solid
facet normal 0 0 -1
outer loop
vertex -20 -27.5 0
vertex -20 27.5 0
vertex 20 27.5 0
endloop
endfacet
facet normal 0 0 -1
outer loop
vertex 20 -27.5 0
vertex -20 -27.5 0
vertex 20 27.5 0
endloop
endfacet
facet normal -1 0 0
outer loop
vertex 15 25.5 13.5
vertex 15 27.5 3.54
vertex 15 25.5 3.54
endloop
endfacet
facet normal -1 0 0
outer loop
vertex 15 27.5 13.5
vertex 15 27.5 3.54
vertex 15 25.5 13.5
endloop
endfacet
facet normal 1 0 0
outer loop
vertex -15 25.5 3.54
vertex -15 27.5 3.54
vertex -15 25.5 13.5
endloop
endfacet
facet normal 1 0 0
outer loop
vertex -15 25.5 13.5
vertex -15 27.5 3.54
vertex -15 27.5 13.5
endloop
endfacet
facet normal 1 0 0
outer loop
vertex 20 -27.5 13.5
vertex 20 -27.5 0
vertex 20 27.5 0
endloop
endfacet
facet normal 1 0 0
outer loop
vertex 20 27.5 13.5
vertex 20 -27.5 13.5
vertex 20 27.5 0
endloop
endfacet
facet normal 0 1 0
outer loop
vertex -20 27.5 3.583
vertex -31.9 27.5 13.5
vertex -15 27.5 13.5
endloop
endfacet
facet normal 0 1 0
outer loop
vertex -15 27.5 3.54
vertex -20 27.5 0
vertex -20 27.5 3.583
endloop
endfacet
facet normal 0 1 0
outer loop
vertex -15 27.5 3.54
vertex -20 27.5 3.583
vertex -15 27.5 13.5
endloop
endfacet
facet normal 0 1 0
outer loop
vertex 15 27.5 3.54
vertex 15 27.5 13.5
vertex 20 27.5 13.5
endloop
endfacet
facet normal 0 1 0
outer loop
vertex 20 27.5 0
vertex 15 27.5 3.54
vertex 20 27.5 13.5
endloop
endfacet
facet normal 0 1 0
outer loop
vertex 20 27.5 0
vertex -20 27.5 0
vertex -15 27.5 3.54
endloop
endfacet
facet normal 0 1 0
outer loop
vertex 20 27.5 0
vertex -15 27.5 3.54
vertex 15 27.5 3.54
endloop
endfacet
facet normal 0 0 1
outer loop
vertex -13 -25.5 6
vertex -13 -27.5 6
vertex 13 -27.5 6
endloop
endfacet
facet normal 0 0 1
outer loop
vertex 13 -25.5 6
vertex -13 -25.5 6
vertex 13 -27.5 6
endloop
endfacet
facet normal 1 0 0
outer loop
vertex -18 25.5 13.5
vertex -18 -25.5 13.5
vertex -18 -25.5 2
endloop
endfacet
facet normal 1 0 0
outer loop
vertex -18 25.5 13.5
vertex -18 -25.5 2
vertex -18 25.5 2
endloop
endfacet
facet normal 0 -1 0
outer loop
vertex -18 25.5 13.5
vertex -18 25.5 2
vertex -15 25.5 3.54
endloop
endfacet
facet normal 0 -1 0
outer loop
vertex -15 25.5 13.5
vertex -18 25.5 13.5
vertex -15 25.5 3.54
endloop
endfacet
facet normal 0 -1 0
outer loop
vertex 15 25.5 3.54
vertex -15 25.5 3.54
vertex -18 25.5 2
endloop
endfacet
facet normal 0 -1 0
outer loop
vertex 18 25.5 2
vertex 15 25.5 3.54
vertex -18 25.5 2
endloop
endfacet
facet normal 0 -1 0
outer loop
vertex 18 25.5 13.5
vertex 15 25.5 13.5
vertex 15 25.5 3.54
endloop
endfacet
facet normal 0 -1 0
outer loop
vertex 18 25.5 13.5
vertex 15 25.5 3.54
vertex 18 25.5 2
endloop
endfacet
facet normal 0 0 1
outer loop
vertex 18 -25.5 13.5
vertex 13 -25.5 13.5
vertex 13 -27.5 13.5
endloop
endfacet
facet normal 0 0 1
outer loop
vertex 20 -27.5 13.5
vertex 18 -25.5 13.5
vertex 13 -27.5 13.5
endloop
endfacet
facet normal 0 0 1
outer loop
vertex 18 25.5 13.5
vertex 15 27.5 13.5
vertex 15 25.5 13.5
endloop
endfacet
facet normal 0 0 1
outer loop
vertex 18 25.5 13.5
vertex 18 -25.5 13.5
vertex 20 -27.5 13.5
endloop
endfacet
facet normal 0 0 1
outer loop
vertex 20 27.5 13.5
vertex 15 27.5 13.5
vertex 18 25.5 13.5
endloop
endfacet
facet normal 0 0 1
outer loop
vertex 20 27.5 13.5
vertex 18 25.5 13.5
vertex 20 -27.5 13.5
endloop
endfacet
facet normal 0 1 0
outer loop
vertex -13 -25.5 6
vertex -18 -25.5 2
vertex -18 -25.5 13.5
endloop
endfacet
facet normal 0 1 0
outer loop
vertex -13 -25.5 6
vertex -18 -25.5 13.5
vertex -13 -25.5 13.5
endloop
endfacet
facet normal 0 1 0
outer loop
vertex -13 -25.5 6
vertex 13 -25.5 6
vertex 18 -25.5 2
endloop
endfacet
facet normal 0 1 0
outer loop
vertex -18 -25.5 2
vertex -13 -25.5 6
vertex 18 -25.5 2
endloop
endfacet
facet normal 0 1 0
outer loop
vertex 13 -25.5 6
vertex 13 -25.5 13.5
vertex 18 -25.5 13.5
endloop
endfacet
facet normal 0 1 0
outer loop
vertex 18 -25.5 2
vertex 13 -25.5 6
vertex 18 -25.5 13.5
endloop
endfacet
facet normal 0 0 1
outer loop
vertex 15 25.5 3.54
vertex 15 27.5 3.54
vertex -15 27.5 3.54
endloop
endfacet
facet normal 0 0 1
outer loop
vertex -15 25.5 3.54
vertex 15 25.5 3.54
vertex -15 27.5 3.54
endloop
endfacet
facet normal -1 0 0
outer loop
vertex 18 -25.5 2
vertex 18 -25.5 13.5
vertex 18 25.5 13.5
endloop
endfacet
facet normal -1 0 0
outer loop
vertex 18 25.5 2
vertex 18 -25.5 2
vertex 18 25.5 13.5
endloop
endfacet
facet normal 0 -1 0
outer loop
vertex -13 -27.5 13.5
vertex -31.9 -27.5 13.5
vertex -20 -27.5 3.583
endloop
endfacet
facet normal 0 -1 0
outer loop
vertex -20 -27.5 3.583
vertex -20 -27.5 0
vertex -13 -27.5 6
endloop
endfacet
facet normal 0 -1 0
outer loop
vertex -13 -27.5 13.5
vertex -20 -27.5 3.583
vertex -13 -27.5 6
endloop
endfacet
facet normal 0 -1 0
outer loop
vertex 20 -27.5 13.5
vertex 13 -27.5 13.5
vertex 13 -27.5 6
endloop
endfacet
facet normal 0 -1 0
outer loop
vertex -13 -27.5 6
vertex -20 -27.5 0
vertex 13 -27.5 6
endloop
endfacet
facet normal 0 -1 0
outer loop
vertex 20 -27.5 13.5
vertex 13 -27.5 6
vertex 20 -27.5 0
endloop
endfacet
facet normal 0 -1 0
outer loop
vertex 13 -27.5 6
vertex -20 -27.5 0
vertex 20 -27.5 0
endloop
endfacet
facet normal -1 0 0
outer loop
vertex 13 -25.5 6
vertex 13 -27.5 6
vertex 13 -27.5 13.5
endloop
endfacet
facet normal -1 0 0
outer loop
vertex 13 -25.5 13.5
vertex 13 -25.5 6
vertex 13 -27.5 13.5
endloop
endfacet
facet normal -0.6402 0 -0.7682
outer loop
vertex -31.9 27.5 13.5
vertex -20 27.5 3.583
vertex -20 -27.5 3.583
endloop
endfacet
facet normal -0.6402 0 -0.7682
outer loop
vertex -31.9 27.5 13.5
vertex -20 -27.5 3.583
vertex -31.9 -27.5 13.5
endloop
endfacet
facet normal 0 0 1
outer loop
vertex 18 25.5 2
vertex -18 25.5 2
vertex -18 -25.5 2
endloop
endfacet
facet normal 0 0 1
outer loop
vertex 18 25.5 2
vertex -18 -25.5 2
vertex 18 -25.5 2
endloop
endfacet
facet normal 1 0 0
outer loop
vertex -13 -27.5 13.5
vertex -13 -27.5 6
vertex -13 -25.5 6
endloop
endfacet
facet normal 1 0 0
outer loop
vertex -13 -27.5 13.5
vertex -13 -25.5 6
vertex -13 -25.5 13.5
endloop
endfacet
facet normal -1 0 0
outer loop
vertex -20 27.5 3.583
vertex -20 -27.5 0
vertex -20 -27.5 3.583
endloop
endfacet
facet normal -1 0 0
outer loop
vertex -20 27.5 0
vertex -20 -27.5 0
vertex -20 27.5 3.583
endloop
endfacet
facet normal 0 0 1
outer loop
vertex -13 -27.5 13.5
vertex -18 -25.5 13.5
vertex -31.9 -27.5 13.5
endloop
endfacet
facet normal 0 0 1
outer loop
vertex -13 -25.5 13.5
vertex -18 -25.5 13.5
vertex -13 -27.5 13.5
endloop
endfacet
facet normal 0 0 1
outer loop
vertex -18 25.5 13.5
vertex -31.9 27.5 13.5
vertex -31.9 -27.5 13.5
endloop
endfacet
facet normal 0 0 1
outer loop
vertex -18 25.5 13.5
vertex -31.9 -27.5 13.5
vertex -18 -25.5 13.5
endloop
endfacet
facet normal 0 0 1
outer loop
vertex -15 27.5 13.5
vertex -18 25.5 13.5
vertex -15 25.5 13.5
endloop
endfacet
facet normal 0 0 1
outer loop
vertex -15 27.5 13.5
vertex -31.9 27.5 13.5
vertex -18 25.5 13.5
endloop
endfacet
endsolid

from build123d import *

# Parameters (mm, degrees)
SKETCH_W        = 40
SKETCH_H        = 55
PAD_DEPTH       = 13.5
SKETCH001_W     = 36
SKETCH001_H     = 51
POCKET_DEPTH    = 11.5
SKETCH002_W     = 26
SKETCH002_H     = 7.5
POCKET001_DEPTH = 2
SKETCH003_W     = 30
SKETCH003_H     = 9.959645
POCKET002_DEPTH = 2
PAD001_DEPTH    = 55


with BuildPart() as part:
    # Sketch → Pad (new body)
    with BuildSketch(Plane.XY):
        Rectangle(SKETCH_W, SKETCH_H)
    extrude(amount=PAD_DEPTH)

    # Sketch001 (on Face6 of Pad) → Pocket (cut)
    with BuildSketch(Plane.XY.offset(13.5)):
        Rectangle(SKETCH001_W, SKETCH001_H)
    extrude(amount=-POCKET_DEPTH, mode=Mode.SUBTRACT)

    # Sketch002 (on Face6 of Pocket) → Pocket001 (cut)
    with BuildSketch(Plane.XZ.offset(27.5)):
        with Locations((0, 9.75)):
            Rectangle(SKETCH002_W, SKETCH002_H)
    extrude(amount=-POCKET001_DEPTH, mode=Mode.SUBTRACT)

    # Sketch003 (on Face1 of Pocket001) → Pocket002 (cut)
    with BuildSketch(Plane(origin=(0, 27.5, 0), x_dir=(-1, 0, 0), z_dir=(0, 1, 0))):
        with Locations((0, 8.5201775)):
            Rectangle(SKETCH003_W, SKETCH003_H)
    extrude(amount=-POCKET002_DEPTH, mode=Mode.SUBTRACT)

    # Sketch004 (on Face1 of Pocket002) → Pad001 (join)
    with BuildSketch(Plane(origin=(0, 27.5, 0), x_dir=(-1, 0, 0), z_dir=(0, 1, 0))):
        Polygon((19.9, 13.5), (19.9, 3.5), (31.9, 13.5), align=None)
    extrude(amount=-PAD001_DEPTH)


solid = part.part
